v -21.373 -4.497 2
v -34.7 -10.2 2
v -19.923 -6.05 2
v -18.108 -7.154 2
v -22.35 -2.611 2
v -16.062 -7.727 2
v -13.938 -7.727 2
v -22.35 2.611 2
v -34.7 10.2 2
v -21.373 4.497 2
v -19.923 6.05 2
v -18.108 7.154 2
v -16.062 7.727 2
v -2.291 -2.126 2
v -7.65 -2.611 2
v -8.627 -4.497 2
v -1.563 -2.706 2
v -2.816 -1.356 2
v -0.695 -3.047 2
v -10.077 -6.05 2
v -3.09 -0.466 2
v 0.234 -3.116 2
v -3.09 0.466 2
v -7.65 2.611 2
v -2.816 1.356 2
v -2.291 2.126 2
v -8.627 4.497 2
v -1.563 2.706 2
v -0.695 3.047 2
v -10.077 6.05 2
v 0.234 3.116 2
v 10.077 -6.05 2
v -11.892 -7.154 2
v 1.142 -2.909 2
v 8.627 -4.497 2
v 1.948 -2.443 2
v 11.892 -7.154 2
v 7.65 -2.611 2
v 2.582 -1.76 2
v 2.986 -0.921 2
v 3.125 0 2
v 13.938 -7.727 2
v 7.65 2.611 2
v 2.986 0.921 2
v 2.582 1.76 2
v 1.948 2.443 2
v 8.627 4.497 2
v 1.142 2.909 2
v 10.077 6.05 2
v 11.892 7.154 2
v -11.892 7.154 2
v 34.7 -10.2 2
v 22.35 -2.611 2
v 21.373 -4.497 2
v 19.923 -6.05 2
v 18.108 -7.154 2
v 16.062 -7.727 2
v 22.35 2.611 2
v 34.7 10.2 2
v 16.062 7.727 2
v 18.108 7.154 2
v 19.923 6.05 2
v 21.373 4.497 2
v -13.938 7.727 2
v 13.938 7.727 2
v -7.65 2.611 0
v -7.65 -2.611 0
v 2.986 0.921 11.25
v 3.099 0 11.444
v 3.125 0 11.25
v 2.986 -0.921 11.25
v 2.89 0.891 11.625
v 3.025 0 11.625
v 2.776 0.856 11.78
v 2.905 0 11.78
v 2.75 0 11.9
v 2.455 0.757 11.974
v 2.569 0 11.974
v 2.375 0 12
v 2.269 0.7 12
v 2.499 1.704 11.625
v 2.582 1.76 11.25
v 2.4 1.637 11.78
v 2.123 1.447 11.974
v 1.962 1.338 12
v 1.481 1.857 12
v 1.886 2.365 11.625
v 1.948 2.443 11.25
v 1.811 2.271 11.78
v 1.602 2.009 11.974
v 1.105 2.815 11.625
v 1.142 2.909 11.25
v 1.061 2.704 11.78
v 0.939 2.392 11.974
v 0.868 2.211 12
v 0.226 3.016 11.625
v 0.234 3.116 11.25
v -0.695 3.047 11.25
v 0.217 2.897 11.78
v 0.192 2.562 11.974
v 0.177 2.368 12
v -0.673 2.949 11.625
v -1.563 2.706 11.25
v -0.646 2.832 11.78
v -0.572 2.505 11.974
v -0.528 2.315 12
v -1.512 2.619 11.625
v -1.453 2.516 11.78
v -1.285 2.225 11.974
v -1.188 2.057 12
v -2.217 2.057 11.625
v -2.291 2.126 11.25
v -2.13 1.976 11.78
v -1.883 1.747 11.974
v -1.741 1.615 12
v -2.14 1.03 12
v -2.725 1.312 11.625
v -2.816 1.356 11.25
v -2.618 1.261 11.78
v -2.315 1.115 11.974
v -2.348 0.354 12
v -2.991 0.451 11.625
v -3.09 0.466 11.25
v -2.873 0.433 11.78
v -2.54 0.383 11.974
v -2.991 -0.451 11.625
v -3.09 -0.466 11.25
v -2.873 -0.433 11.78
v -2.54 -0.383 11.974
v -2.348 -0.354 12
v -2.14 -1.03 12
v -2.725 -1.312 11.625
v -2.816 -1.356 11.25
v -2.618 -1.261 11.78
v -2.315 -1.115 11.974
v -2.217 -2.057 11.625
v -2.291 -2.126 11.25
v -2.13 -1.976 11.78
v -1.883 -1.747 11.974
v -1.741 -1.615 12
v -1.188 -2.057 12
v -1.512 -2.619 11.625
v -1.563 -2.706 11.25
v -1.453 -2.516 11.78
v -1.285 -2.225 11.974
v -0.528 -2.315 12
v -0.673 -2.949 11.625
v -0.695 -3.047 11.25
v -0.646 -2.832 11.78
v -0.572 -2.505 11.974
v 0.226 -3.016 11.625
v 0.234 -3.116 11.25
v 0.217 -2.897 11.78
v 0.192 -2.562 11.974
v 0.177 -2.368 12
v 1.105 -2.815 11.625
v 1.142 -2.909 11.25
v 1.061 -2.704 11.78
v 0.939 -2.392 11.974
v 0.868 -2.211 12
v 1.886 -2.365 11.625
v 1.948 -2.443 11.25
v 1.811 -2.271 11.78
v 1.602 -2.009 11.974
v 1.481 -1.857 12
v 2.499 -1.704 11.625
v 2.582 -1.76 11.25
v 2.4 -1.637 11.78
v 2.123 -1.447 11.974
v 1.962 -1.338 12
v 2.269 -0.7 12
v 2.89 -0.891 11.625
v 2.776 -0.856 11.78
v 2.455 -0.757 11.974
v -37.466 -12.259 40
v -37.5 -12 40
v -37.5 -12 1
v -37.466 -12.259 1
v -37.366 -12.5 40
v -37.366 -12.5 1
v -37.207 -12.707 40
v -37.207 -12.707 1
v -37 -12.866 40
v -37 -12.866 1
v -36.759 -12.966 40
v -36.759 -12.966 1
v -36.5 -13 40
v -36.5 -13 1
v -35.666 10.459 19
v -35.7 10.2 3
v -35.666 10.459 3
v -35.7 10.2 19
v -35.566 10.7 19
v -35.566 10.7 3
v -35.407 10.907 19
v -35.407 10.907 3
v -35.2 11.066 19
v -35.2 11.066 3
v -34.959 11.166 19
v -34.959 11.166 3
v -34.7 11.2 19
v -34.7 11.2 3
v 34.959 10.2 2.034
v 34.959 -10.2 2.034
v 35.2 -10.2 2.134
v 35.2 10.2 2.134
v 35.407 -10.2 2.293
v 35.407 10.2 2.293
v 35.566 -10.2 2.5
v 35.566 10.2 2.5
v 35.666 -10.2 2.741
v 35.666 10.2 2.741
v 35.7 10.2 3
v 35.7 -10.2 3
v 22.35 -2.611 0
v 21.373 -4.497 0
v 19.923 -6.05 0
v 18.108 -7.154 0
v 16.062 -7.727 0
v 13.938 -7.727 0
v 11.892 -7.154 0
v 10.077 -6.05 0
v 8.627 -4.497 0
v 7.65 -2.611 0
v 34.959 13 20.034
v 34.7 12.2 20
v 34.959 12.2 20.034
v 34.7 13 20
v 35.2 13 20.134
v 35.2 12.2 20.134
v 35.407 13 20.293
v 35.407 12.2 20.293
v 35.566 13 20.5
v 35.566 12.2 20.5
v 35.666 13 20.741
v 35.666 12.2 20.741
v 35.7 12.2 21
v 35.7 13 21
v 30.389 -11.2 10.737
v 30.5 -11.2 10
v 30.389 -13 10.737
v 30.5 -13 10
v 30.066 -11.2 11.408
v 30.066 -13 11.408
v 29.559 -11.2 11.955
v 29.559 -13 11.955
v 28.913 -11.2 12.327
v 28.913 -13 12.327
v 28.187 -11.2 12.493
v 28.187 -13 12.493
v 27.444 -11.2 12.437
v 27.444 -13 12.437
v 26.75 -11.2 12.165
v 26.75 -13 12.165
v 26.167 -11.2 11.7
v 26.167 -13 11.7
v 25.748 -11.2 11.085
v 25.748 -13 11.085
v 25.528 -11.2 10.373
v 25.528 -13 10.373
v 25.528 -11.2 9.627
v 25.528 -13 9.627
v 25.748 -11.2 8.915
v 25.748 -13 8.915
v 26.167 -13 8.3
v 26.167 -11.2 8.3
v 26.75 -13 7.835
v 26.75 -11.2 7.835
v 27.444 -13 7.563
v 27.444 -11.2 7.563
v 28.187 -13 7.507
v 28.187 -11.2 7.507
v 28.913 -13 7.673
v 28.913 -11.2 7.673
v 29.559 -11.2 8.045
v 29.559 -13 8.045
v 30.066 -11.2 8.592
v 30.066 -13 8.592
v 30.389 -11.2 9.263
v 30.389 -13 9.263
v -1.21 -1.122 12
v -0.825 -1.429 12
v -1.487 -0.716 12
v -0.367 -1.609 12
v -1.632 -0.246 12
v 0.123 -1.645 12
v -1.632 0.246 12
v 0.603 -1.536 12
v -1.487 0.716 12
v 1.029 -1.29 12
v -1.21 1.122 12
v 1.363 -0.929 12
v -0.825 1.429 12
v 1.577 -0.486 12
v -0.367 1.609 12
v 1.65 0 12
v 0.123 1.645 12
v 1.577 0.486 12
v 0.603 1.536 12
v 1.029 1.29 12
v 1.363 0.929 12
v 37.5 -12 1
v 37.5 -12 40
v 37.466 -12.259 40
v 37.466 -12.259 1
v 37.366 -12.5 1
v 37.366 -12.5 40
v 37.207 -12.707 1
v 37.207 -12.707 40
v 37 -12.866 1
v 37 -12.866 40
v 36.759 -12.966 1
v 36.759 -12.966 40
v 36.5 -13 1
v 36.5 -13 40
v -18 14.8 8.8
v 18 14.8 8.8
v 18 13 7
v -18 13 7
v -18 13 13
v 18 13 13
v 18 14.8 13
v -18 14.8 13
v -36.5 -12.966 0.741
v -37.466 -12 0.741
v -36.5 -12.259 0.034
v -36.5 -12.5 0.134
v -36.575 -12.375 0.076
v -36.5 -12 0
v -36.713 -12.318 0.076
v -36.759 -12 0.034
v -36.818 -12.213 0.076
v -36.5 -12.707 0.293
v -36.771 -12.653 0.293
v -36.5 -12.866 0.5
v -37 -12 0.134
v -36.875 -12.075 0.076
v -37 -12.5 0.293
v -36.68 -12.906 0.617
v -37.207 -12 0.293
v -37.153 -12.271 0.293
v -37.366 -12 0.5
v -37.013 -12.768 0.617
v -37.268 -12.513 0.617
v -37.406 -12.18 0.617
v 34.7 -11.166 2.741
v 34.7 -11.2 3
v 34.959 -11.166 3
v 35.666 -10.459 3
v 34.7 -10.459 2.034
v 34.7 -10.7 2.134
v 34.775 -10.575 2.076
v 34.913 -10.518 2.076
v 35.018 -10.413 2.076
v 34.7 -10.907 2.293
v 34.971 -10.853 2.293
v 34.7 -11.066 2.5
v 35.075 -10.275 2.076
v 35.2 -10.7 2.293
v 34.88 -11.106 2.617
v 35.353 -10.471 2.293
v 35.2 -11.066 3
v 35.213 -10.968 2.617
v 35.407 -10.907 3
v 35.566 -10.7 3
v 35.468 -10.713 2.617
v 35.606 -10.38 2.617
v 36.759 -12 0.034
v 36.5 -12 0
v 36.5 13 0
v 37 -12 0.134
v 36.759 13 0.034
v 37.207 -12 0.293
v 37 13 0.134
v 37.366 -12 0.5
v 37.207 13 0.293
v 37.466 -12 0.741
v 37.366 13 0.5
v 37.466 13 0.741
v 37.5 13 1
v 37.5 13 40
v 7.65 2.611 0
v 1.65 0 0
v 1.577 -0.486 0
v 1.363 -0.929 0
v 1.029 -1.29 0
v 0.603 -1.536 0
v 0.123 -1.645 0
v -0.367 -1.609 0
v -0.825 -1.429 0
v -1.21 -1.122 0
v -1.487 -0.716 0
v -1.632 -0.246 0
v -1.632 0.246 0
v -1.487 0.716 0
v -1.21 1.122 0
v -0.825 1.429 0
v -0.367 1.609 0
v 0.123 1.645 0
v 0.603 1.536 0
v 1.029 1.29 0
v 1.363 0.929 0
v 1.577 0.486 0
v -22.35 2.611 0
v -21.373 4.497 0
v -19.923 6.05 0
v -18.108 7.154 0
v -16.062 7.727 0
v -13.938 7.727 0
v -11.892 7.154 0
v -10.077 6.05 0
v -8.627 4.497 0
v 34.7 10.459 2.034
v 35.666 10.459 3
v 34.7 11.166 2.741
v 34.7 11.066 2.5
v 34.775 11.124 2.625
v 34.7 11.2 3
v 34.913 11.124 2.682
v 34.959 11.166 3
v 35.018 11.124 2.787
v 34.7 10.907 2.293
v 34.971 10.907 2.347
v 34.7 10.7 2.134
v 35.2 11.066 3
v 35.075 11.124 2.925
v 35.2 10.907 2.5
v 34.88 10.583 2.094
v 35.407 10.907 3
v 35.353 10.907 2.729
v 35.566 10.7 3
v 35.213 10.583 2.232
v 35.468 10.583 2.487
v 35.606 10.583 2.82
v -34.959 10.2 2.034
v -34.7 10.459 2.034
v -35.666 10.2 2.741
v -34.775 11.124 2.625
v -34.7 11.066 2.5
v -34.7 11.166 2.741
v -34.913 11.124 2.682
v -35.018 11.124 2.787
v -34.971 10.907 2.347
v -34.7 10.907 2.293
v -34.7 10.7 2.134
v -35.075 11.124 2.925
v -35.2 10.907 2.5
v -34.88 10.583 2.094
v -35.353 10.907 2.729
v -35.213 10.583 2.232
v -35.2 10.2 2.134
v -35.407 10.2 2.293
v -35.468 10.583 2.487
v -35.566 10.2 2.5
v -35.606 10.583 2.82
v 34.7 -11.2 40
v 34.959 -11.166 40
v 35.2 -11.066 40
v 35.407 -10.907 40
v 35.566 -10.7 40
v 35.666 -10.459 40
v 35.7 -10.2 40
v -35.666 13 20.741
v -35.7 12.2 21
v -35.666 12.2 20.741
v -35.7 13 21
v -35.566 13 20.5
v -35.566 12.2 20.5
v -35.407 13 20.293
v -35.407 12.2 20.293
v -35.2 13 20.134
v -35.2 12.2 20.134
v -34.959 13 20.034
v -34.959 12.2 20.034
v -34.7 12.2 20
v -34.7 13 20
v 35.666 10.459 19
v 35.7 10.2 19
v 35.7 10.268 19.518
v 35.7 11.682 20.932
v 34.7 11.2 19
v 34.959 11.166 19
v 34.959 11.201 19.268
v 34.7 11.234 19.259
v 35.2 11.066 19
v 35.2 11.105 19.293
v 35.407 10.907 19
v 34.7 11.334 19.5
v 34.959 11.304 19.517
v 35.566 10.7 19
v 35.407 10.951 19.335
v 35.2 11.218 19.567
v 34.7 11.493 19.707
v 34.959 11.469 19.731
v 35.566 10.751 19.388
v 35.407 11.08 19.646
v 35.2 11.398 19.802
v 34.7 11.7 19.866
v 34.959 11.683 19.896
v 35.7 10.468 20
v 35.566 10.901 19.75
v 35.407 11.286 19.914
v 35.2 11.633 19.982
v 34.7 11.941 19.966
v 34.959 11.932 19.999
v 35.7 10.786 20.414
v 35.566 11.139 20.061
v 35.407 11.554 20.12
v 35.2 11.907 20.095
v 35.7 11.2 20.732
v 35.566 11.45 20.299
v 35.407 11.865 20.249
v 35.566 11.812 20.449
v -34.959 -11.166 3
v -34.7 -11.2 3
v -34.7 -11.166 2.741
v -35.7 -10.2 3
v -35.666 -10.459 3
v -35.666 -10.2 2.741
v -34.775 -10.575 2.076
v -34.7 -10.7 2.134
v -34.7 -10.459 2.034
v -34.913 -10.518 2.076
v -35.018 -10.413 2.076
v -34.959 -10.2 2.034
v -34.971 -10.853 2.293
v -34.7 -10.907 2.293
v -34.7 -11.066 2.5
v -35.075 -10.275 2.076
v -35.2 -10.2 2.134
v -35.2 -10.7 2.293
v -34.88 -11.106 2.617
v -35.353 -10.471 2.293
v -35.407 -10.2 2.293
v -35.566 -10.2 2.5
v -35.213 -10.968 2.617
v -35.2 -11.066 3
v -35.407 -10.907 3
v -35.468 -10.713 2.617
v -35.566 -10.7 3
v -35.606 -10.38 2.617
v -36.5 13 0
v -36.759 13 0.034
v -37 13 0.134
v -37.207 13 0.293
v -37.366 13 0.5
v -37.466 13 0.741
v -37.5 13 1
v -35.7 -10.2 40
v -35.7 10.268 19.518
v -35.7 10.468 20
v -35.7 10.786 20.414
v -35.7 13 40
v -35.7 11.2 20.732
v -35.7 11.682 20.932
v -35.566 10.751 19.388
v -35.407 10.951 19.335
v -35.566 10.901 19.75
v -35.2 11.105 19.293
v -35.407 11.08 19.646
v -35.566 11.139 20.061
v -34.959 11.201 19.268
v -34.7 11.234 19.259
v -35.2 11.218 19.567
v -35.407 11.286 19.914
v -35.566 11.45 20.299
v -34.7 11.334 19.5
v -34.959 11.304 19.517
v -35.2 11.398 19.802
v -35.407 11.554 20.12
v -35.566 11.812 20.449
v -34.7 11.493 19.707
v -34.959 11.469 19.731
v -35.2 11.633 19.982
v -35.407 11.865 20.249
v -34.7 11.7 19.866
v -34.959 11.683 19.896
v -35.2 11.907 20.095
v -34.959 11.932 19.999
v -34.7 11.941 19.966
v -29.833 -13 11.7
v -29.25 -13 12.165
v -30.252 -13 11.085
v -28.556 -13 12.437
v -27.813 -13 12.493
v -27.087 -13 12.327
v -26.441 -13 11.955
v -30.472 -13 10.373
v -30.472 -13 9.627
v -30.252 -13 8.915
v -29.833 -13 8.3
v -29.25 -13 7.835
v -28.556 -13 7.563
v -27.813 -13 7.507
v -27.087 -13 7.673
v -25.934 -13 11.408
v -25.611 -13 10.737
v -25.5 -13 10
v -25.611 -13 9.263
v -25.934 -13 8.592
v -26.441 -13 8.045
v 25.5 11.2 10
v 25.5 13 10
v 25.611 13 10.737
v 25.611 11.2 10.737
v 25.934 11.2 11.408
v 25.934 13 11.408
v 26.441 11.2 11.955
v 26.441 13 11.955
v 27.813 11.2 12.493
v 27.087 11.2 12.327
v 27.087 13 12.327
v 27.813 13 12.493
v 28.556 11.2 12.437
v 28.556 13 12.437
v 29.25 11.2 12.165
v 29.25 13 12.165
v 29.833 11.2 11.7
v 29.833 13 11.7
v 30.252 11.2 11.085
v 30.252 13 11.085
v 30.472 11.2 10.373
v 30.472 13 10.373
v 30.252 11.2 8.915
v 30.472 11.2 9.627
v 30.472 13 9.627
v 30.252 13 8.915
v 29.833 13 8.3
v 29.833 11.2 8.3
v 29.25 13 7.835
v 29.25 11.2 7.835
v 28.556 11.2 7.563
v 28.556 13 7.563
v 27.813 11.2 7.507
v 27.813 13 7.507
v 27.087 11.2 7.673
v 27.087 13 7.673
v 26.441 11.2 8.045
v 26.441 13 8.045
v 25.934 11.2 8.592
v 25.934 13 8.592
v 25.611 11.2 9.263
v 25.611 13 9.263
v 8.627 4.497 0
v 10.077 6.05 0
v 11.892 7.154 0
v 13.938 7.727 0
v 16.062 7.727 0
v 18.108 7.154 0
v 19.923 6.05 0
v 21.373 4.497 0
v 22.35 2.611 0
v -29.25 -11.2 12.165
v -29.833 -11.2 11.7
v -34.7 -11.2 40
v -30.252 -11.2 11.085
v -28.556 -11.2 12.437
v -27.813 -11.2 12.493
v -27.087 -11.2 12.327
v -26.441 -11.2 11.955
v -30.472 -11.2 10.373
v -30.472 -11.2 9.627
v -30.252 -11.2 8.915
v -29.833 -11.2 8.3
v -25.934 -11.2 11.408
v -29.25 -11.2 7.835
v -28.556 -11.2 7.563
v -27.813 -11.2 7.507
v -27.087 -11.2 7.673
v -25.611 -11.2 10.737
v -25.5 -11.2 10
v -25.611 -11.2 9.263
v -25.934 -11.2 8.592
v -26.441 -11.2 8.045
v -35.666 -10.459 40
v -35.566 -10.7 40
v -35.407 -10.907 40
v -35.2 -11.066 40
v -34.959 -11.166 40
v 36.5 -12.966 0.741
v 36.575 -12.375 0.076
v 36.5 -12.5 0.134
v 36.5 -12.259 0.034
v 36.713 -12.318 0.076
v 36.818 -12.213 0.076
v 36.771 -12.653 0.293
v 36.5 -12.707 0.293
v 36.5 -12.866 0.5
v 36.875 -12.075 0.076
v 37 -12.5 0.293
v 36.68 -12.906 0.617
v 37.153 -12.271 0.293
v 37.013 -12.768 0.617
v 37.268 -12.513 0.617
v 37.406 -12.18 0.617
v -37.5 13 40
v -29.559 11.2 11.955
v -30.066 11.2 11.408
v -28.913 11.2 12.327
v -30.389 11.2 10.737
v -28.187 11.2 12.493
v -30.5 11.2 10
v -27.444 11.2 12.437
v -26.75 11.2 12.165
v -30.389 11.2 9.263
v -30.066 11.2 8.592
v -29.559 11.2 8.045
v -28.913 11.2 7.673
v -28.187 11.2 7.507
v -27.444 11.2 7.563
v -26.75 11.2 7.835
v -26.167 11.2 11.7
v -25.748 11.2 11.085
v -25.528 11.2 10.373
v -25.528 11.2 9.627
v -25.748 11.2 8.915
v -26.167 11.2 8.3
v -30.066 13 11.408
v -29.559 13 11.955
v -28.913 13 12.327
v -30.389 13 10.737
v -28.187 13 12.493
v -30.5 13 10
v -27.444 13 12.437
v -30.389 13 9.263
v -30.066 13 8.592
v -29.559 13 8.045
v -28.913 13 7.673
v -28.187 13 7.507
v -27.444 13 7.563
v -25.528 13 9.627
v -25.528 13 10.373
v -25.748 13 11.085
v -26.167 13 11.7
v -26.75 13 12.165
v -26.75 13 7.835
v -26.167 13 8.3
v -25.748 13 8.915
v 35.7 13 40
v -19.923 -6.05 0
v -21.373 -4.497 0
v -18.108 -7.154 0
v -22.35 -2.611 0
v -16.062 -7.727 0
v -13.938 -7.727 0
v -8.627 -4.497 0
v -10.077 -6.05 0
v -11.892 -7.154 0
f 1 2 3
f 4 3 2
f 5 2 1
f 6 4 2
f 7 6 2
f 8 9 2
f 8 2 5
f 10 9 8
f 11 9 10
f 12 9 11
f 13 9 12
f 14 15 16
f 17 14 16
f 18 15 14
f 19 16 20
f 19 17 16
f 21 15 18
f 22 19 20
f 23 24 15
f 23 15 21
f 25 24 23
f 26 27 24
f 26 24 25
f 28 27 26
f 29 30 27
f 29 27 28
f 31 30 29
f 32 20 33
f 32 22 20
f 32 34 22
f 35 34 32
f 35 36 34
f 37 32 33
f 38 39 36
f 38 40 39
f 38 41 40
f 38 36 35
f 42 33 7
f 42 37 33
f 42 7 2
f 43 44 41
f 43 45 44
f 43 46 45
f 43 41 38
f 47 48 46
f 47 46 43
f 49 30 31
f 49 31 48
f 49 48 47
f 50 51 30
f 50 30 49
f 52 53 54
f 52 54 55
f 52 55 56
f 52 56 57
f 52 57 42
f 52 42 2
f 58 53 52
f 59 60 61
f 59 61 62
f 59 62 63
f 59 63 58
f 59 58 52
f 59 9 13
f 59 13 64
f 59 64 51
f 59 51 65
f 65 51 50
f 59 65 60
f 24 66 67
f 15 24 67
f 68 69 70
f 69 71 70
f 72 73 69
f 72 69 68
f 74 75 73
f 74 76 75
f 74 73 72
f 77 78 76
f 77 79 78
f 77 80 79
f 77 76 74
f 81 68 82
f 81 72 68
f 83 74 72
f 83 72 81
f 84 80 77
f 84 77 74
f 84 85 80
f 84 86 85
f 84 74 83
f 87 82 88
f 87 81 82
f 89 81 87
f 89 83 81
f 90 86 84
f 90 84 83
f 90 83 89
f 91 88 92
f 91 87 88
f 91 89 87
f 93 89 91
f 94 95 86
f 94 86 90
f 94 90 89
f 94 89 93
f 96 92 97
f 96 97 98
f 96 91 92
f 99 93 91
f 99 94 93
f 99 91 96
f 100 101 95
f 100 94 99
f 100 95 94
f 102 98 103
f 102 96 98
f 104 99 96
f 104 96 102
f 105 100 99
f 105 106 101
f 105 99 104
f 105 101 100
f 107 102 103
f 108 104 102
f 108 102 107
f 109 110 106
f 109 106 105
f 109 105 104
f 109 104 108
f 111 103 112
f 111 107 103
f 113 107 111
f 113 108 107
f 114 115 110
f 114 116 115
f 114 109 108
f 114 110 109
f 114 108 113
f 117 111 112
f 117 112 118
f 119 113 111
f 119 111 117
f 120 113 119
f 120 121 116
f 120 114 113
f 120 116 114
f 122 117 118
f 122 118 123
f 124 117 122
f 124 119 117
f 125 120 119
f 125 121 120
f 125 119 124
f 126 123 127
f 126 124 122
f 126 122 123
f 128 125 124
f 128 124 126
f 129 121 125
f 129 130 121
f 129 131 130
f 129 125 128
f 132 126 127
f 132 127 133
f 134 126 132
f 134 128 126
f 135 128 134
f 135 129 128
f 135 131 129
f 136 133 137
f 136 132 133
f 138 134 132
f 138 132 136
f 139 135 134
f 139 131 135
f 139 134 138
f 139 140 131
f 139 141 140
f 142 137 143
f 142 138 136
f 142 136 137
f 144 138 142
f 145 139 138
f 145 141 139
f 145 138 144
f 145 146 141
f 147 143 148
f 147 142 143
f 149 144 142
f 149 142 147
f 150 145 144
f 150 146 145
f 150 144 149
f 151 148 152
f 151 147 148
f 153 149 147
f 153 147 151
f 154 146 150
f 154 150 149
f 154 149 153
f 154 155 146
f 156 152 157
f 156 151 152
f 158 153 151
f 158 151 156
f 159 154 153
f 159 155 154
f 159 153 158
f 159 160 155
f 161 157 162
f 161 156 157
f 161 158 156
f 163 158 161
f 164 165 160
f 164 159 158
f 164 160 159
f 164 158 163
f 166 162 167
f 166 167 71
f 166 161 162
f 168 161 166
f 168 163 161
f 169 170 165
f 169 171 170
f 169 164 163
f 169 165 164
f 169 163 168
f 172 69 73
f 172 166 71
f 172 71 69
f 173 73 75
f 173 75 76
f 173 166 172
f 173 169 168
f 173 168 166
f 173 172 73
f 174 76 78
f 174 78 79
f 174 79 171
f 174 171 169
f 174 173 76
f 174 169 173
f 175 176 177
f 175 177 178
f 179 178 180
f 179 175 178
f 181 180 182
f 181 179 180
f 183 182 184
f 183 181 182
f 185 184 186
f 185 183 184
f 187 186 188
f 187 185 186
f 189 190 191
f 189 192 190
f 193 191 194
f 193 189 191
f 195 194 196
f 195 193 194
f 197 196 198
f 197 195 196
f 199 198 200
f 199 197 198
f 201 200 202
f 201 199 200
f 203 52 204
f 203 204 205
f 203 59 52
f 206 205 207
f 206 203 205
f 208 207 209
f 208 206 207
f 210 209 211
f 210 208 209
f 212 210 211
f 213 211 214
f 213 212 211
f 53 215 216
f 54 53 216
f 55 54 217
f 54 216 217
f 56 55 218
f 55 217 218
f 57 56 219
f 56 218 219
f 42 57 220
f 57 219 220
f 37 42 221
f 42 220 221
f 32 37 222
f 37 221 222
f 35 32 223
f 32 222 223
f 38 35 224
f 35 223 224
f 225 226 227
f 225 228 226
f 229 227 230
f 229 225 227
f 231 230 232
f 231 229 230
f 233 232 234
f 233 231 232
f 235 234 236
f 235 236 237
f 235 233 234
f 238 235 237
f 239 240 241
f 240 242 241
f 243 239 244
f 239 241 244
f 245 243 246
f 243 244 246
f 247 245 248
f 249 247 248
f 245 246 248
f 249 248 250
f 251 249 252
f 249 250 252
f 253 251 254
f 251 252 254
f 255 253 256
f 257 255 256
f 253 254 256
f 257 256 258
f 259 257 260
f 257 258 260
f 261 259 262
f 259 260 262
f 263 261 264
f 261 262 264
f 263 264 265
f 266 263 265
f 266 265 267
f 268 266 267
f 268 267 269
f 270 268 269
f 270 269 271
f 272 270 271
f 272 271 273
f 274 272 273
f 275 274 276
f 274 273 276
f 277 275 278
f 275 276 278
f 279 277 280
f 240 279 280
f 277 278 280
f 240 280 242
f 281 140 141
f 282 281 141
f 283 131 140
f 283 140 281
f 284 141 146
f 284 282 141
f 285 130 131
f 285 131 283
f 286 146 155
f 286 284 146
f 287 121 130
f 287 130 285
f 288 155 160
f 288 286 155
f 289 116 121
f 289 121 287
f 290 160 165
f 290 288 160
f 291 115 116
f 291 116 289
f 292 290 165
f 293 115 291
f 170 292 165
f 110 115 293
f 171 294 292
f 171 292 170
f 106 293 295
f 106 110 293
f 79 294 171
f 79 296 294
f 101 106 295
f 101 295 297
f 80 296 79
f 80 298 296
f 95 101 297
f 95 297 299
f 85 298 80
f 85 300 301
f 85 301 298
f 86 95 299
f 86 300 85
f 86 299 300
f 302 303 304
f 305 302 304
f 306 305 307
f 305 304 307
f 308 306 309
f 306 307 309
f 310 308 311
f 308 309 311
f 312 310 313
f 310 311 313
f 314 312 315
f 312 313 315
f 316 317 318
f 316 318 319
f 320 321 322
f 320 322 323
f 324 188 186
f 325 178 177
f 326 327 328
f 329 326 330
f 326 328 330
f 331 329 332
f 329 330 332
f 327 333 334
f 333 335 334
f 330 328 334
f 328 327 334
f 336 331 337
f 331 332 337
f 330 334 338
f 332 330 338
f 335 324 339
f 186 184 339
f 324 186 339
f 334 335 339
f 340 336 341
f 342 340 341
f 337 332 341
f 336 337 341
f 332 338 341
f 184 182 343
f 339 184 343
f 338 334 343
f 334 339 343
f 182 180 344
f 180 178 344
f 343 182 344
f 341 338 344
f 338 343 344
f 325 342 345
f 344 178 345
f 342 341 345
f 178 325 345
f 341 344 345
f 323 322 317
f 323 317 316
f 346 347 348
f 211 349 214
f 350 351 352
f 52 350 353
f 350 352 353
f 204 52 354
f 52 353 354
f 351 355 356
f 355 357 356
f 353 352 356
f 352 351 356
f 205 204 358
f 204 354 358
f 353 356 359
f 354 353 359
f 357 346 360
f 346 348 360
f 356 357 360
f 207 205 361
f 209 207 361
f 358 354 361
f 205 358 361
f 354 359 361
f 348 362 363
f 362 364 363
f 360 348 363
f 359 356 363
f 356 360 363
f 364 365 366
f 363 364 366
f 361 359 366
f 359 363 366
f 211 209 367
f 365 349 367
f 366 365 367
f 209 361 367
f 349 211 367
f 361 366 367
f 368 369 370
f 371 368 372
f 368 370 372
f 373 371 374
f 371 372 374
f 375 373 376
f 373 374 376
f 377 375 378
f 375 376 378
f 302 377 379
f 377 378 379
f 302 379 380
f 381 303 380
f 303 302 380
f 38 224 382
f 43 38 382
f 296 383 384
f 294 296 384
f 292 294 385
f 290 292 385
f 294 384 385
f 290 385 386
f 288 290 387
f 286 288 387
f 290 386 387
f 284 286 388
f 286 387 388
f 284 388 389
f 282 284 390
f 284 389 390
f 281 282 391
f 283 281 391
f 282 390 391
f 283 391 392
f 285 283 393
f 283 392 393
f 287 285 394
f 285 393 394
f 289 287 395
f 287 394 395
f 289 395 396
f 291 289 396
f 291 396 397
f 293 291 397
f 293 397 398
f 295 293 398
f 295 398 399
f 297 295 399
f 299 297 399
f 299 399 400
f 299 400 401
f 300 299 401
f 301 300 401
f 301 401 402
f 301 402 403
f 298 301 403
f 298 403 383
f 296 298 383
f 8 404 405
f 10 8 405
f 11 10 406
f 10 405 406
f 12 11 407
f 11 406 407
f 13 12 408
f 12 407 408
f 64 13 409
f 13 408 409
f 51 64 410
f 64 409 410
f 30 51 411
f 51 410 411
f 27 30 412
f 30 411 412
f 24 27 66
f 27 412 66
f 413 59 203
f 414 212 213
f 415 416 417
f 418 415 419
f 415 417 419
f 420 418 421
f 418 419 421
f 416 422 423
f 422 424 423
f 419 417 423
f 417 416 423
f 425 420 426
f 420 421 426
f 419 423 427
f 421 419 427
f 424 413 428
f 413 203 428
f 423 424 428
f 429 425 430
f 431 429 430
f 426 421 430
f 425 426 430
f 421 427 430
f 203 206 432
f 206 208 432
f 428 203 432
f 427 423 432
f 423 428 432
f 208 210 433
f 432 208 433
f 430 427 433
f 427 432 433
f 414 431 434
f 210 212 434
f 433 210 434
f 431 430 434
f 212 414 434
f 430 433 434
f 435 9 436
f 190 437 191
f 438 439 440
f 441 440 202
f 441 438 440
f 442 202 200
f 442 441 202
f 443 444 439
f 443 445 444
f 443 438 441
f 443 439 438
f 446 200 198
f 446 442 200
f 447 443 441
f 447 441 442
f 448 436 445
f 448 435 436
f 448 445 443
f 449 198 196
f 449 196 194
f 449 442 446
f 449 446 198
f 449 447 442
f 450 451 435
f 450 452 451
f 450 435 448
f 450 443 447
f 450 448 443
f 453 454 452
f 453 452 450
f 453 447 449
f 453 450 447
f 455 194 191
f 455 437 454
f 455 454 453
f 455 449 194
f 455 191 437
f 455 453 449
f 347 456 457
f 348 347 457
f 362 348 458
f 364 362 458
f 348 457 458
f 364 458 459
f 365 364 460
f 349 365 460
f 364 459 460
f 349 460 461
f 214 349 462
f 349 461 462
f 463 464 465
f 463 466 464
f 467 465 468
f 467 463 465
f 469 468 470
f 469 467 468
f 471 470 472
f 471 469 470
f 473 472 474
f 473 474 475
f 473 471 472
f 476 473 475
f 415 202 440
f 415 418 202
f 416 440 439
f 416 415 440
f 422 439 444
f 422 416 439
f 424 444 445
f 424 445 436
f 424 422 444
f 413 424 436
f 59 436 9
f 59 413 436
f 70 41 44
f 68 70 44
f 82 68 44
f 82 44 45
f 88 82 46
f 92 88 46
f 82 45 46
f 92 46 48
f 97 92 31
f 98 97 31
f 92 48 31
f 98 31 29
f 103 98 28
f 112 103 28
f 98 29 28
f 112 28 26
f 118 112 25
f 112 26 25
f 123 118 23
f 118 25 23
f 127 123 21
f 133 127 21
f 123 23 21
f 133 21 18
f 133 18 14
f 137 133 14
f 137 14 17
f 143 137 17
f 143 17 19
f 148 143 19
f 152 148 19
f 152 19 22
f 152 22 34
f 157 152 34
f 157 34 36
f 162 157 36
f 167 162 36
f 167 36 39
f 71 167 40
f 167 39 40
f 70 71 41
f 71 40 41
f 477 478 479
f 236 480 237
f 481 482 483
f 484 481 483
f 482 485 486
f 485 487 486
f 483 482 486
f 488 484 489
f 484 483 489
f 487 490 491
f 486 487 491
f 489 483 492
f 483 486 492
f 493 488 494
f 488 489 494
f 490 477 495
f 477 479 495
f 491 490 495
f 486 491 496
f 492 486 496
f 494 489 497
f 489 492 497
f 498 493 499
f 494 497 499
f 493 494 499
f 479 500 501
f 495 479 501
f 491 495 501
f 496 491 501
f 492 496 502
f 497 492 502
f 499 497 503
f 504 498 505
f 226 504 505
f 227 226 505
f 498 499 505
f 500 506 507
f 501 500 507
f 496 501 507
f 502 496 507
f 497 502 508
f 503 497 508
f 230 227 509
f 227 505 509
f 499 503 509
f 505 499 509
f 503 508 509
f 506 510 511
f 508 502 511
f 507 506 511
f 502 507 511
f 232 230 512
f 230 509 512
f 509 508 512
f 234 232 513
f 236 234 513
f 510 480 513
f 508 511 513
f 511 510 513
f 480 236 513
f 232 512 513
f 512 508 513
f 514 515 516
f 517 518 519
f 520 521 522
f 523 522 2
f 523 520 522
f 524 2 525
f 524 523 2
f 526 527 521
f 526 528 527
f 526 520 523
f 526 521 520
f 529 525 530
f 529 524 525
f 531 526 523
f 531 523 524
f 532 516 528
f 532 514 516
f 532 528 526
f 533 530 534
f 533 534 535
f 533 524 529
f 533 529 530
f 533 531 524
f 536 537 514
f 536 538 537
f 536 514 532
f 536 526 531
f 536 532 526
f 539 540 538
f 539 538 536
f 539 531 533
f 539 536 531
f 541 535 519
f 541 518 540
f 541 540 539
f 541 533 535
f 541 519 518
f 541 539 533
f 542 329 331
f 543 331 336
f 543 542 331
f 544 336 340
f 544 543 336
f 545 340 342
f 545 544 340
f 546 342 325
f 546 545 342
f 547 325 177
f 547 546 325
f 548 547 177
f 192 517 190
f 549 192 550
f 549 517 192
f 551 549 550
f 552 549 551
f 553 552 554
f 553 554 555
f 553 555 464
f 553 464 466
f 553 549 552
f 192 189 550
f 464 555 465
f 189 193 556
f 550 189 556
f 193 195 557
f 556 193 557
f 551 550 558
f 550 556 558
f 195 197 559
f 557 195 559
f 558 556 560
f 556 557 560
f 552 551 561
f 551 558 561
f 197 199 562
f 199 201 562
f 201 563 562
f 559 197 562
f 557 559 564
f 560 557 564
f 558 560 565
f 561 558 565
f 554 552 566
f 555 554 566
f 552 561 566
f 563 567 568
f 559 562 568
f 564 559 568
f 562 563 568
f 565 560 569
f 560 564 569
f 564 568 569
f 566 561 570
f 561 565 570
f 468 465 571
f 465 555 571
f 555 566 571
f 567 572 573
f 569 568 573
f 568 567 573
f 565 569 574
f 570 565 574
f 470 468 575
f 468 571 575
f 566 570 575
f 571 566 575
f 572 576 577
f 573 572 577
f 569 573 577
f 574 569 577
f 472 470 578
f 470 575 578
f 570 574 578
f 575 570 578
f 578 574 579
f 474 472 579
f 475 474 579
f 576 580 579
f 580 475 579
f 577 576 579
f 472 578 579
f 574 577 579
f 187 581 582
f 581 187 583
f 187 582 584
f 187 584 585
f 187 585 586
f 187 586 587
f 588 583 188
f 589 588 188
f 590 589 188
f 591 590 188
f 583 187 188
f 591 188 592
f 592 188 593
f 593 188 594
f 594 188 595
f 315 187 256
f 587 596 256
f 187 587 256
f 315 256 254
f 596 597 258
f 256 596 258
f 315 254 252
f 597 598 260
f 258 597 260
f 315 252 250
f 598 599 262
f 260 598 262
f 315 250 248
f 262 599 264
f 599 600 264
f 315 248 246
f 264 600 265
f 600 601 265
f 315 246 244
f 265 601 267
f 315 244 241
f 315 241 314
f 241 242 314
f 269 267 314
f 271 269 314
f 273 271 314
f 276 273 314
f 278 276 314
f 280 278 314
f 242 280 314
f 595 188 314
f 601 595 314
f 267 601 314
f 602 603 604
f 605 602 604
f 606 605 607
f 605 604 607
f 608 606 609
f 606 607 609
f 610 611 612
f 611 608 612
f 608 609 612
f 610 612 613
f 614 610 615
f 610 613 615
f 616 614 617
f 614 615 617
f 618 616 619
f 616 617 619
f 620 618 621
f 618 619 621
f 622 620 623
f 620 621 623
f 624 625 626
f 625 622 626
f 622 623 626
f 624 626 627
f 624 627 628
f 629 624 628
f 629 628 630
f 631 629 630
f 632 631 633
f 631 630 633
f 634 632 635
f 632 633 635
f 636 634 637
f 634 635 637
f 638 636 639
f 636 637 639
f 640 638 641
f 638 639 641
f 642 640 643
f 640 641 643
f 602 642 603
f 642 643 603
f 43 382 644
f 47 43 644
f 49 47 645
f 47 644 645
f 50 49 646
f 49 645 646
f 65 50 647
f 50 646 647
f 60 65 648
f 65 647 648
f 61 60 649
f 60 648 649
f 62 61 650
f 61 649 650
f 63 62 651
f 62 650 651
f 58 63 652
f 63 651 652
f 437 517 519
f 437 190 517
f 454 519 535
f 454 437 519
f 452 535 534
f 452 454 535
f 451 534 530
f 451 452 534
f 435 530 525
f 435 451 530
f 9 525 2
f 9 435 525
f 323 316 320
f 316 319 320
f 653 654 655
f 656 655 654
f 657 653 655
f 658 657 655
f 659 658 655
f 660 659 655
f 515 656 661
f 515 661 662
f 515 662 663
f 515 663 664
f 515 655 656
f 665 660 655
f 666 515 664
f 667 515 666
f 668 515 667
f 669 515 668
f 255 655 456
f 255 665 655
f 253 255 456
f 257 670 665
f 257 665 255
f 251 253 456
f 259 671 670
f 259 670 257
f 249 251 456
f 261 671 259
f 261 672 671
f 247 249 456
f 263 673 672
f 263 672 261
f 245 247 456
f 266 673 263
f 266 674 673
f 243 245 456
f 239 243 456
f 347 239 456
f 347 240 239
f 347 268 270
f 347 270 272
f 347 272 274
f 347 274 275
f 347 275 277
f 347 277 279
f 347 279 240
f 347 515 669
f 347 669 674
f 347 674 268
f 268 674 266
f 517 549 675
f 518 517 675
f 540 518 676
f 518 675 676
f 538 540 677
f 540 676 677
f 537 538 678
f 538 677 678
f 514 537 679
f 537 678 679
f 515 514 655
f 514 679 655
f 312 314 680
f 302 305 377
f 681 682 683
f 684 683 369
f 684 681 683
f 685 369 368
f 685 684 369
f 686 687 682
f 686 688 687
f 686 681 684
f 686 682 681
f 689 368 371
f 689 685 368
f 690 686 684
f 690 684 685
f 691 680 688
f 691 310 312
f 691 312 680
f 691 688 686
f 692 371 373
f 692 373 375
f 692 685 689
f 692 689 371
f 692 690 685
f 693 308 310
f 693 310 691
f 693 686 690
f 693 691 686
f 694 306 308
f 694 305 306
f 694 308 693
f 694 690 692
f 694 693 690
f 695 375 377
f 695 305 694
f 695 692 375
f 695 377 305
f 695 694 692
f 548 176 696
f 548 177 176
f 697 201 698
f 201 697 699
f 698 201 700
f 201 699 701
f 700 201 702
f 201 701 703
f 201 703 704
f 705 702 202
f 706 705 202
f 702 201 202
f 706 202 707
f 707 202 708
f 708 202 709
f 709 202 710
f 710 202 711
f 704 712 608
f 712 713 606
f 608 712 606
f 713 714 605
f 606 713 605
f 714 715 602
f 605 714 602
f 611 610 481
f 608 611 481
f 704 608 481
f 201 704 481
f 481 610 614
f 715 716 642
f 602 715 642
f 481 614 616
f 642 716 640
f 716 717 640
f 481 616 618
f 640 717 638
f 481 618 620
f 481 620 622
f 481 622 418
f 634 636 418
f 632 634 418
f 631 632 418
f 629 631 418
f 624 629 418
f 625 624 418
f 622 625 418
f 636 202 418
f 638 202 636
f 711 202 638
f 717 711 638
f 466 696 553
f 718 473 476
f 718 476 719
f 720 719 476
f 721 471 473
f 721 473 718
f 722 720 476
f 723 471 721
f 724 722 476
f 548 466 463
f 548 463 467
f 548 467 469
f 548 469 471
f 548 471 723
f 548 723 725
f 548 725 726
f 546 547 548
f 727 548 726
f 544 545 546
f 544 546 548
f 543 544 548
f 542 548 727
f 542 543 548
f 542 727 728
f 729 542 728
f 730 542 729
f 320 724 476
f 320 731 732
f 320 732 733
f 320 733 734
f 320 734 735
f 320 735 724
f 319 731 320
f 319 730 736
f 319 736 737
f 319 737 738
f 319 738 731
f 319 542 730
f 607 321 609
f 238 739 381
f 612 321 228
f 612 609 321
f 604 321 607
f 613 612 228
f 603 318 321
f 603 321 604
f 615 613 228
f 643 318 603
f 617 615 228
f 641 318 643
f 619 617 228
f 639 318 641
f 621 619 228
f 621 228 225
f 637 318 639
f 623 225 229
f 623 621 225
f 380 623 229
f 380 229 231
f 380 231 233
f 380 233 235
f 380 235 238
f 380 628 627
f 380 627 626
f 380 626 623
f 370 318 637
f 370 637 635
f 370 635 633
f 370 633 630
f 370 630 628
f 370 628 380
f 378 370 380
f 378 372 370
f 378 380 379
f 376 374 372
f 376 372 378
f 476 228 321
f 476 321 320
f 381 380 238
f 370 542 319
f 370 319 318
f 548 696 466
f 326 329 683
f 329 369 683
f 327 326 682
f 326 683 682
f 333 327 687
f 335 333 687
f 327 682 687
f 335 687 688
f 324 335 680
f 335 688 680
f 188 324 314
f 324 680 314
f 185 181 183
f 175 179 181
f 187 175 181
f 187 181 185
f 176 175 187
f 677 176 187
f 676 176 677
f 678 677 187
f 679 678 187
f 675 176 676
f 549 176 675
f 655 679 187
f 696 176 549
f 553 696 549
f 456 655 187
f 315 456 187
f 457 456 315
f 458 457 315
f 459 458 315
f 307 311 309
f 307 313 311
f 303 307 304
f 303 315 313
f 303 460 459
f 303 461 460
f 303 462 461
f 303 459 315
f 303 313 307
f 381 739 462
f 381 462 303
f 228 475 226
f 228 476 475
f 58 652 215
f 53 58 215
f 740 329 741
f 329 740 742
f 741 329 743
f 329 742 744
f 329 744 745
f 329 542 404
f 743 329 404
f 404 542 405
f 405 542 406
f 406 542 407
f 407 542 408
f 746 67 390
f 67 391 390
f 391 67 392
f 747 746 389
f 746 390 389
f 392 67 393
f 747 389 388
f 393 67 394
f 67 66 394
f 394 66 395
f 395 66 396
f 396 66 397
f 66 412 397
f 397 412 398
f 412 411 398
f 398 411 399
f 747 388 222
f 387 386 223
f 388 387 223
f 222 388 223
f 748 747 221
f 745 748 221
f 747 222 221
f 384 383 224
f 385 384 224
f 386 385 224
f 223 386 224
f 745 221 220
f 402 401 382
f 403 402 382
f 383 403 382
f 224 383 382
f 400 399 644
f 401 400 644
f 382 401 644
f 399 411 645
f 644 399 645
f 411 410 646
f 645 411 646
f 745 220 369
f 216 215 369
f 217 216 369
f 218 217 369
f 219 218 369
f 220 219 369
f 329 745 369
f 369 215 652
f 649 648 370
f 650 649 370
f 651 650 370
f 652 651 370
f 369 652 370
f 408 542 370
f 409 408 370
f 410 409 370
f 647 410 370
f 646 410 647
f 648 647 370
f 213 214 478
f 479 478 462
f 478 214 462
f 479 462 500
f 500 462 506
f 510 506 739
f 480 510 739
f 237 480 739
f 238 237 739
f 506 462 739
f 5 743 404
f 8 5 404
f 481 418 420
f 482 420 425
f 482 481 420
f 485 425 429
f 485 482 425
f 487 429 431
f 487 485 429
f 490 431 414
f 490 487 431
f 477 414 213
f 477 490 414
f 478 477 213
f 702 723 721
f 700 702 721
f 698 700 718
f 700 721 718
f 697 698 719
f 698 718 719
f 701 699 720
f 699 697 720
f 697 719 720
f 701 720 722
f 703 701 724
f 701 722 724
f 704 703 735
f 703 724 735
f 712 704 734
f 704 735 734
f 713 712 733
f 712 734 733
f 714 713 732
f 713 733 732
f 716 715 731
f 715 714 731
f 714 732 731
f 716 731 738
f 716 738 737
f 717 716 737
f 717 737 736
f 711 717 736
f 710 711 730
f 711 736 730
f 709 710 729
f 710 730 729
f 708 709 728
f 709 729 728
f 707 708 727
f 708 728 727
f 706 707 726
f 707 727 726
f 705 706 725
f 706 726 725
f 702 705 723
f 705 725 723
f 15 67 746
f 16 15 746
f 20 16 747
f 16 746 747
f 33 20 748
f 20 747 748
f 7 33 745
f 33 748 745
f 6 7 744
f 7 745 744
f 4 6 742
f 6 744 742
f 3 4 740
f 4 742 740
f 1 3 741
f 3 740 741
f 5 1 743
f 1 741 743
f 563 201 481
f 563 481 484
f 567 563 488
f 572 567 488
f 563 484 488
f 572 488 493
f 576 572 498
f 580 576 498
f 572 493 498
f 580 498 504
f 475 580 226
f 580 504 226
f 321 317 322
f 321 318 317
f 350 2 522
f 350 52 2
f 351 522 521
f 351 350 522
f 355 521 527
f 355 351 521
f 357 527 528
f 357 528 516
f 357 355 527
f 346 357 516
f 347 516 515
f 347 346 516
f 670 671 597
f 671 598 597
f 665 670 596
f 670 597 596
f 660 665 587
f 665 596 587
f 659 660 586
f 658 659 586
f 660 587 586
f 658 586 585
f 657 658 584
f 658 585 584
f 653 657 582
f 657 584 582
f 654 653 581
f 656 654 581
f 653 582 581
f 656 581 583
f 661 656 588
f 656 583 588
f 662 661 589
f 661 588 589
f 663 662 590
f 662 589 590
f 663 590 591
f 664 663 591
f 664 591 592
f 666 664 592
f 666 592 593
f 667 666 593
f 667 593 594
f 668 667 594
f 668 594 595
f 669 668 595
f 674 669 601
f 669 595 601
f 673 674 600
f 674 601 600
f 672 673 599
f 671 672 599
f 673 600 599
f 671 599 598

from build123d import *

# Parameters (mm, degrees)
F0_W      = 75
F0_H      = 26
F1_DEPTH  = 2
F2_W      = 75
F2_H      = 26
F2_W_2    = 71.4
F2_H_2    = 22.4
F3_DEPTH  = 38
F5_DEPTH  = 2
F6_R      = 2.5
F7_DEPTH  = 1.8
F8_W      = 36
F8_H      = 6
F9_DEPTH  = 1.8
F10_SIZE  = 1.79999
F11_W     = 71.4
F11_H     = 1.8
F12_DEPTH = 20
F13_R     = 3.125
F14_DEPTH = 10
F15_R     = 0.75
F16_R     = 1.65
F17_DEPTH = 40.001
F18_F1_R  = 1
F18_F2_R  = 1
F19_R     = 2.5
F20_DEPTH = 27.801


# Not quite as in the source:
# - a fillet or chamfer is up to 0.001 mm smaller than in the source, because OpenCascade refuses the exact size


with BuildPart() as f1:
    # F0 (on Top) → F1 (new body)
    with BuildSketch(Plane.XY):
        Rectangle(F0_W, F0_H)
    extrude(amount=F1_DEPTH)

    # F2 (on face) → F3 (join)
    with BuildSketch(Plane.XY.offset(2)):
        Rectangle(F2_W, F2_H)
        Rectangle(F2_W_2, F2_H_2, mode=Mode.SUBTRACT)
    extrude(amount=F3_DEPTH)

    # F4 (on face) → F5 (cut, through all)
    with BuildSketch(Plane(origin=(0, 0, 0), x_dir=(1, 0, 0), z_dir=(0, 0, -1))):
        with BuildLine():
            Line((-22.35, 2.6110342778), (-22.35, -2.6110342778))
            ThreePointArc((-22.35, -2.6110342778), (-15, -7.8), (-7.65, -2.6110342778))
            Line((-7.65, -2.6110342778), (-7.65, 2.6110342778))
            ThreePointArc((-7.65, 2.6110342778), (-15, 7.8), (-22.35, 2.6110342778))
        make_face()
        with BuildLine():
            ThreePointArc((22.35, 2.6110342778), (15, 7.8), (7.65, 2.6110342778))
            Line((7.65, 2.6110342778), (7.65, -2.6110342778))
            ThreePointArc((7.65, -2.6110342778), (15, -7.8), (22.35, -2.6110342778))
            Line((22.35, -2.6110342778), (22.35, 2.6110342778))
        make_face()
    extrude(amount=-F5_DEPTH, mode=Mode.SUBTRACT)

    # F6 (on face) → F7 (cut, through all)
    with BuildSketch(Plane(origin=(0, 13, 0), x_dir=(-1, 0, 0), z_dir=(0, 1, 0))):
        with Locations((28, 10)):
            Circle(F6_R)
        with Locations((-28, 10)):
            Circle(F6_R)
    extrude(amount=-F7_DEPTH, mode=Mode.SUBTRACT)

    # F8 (on face) → F9 (join)
    with BuildSketch(Plane(origin=(0, 13, 0), x_dir=(-1, 0, 0), z_dir=(0, 1, 0))):
        with Locations((0, 10)):
            Rectangle(F8_W, F8_H)
    extrude(amount=F9_DEPTH)

    # F10 (size 1.8 in the source; OpenCascade refuses exactly that, so slightly less here)
    f10_edges = [f1.edges().sort_by_distance(p)[0] for p in [
        (0, 14.8, 7),
    ]]
    chamfer(f10_edges, length=F10_SIZE)

    # F11 (on face) → F12 (cut)
    with BuildSketch(Plane.XY.offset(40)):
        with Locations((0, 12.1)):
            Rectangle(F11_W, F11_H)
    extrude(amount=-F12_DEPTH, mode=Mode.SUBTRACT)

    # F13 (on face) → F14 (join)
    with BuildSketch(Plane.XY.offset(2)):
        Circle(F13_R)
    extrude(amount=F14_DEPTH)

    # F15
    f15_edges = [f1.edges().sort_by_distance(p)[0] for p in [
        (-3.125, 0, 12),
    ]]
    fillet(f15_edges, radius=F15_R)

    # F16 (on face) → F17 (cut, through all)
    with BuildSketch(Plane(origin=(0, 0, 0), x_dir=(1, 0, 0), z_dir=(0, 0, -1))):
        Circle(F16_R)
    extrude(amount=-F17_DEPTH, mode=Mode.SUBTRACT)

    # F18: fillet of radius 1 on 14 edges, made by hand

    # F18_f1
    f18_f1_edges = [f1.edges().sort_by_distance(p)[0] for p in [
        (-37.5, -13, 20),
        (37.5, -13, 20),
        (0, -13, 0),
        (37.5, 0, 0),
        (-37.5, 0, 0),
        (0, 11.2, 20),
    ]]
    fillet(f18_f1_edges, radius=F18_F1_R)

    # F18_f2
    f18_f2_edges = [f1.edges().sort_by_distance(p)[0] for p in [
        (-35.7, -11.2, 21),
        (35.7, -11.2, 21),
        (0, -11.2, 2),
        (35.7, 0, 2),
        (-35.7, 0, 2),
        (0, 11.2, 2),
        (35.7, 11.2, 10.5),
        (-35.7, 11.2, 10.5),
        (-35.7, 11.4928932188, 19.7071067812),
        (35.7, 11.4928932188, 19.7071067812),
    ]]
    fillet(f18_f2_edges, radius=F18_F2_R)

    # F19 (on face) → F20 (cut, through all)
    with BuildSketch(Plane.XZ.offset(13)):
        with Locations((28, 10)):
            Circle(F19_R)
        with Locations((-28, 10)):
            Circle(F19_R)
    extrude(amount=-F20_DEPTH, mode=Mode.SUBTRACT)


solid = f1.part
